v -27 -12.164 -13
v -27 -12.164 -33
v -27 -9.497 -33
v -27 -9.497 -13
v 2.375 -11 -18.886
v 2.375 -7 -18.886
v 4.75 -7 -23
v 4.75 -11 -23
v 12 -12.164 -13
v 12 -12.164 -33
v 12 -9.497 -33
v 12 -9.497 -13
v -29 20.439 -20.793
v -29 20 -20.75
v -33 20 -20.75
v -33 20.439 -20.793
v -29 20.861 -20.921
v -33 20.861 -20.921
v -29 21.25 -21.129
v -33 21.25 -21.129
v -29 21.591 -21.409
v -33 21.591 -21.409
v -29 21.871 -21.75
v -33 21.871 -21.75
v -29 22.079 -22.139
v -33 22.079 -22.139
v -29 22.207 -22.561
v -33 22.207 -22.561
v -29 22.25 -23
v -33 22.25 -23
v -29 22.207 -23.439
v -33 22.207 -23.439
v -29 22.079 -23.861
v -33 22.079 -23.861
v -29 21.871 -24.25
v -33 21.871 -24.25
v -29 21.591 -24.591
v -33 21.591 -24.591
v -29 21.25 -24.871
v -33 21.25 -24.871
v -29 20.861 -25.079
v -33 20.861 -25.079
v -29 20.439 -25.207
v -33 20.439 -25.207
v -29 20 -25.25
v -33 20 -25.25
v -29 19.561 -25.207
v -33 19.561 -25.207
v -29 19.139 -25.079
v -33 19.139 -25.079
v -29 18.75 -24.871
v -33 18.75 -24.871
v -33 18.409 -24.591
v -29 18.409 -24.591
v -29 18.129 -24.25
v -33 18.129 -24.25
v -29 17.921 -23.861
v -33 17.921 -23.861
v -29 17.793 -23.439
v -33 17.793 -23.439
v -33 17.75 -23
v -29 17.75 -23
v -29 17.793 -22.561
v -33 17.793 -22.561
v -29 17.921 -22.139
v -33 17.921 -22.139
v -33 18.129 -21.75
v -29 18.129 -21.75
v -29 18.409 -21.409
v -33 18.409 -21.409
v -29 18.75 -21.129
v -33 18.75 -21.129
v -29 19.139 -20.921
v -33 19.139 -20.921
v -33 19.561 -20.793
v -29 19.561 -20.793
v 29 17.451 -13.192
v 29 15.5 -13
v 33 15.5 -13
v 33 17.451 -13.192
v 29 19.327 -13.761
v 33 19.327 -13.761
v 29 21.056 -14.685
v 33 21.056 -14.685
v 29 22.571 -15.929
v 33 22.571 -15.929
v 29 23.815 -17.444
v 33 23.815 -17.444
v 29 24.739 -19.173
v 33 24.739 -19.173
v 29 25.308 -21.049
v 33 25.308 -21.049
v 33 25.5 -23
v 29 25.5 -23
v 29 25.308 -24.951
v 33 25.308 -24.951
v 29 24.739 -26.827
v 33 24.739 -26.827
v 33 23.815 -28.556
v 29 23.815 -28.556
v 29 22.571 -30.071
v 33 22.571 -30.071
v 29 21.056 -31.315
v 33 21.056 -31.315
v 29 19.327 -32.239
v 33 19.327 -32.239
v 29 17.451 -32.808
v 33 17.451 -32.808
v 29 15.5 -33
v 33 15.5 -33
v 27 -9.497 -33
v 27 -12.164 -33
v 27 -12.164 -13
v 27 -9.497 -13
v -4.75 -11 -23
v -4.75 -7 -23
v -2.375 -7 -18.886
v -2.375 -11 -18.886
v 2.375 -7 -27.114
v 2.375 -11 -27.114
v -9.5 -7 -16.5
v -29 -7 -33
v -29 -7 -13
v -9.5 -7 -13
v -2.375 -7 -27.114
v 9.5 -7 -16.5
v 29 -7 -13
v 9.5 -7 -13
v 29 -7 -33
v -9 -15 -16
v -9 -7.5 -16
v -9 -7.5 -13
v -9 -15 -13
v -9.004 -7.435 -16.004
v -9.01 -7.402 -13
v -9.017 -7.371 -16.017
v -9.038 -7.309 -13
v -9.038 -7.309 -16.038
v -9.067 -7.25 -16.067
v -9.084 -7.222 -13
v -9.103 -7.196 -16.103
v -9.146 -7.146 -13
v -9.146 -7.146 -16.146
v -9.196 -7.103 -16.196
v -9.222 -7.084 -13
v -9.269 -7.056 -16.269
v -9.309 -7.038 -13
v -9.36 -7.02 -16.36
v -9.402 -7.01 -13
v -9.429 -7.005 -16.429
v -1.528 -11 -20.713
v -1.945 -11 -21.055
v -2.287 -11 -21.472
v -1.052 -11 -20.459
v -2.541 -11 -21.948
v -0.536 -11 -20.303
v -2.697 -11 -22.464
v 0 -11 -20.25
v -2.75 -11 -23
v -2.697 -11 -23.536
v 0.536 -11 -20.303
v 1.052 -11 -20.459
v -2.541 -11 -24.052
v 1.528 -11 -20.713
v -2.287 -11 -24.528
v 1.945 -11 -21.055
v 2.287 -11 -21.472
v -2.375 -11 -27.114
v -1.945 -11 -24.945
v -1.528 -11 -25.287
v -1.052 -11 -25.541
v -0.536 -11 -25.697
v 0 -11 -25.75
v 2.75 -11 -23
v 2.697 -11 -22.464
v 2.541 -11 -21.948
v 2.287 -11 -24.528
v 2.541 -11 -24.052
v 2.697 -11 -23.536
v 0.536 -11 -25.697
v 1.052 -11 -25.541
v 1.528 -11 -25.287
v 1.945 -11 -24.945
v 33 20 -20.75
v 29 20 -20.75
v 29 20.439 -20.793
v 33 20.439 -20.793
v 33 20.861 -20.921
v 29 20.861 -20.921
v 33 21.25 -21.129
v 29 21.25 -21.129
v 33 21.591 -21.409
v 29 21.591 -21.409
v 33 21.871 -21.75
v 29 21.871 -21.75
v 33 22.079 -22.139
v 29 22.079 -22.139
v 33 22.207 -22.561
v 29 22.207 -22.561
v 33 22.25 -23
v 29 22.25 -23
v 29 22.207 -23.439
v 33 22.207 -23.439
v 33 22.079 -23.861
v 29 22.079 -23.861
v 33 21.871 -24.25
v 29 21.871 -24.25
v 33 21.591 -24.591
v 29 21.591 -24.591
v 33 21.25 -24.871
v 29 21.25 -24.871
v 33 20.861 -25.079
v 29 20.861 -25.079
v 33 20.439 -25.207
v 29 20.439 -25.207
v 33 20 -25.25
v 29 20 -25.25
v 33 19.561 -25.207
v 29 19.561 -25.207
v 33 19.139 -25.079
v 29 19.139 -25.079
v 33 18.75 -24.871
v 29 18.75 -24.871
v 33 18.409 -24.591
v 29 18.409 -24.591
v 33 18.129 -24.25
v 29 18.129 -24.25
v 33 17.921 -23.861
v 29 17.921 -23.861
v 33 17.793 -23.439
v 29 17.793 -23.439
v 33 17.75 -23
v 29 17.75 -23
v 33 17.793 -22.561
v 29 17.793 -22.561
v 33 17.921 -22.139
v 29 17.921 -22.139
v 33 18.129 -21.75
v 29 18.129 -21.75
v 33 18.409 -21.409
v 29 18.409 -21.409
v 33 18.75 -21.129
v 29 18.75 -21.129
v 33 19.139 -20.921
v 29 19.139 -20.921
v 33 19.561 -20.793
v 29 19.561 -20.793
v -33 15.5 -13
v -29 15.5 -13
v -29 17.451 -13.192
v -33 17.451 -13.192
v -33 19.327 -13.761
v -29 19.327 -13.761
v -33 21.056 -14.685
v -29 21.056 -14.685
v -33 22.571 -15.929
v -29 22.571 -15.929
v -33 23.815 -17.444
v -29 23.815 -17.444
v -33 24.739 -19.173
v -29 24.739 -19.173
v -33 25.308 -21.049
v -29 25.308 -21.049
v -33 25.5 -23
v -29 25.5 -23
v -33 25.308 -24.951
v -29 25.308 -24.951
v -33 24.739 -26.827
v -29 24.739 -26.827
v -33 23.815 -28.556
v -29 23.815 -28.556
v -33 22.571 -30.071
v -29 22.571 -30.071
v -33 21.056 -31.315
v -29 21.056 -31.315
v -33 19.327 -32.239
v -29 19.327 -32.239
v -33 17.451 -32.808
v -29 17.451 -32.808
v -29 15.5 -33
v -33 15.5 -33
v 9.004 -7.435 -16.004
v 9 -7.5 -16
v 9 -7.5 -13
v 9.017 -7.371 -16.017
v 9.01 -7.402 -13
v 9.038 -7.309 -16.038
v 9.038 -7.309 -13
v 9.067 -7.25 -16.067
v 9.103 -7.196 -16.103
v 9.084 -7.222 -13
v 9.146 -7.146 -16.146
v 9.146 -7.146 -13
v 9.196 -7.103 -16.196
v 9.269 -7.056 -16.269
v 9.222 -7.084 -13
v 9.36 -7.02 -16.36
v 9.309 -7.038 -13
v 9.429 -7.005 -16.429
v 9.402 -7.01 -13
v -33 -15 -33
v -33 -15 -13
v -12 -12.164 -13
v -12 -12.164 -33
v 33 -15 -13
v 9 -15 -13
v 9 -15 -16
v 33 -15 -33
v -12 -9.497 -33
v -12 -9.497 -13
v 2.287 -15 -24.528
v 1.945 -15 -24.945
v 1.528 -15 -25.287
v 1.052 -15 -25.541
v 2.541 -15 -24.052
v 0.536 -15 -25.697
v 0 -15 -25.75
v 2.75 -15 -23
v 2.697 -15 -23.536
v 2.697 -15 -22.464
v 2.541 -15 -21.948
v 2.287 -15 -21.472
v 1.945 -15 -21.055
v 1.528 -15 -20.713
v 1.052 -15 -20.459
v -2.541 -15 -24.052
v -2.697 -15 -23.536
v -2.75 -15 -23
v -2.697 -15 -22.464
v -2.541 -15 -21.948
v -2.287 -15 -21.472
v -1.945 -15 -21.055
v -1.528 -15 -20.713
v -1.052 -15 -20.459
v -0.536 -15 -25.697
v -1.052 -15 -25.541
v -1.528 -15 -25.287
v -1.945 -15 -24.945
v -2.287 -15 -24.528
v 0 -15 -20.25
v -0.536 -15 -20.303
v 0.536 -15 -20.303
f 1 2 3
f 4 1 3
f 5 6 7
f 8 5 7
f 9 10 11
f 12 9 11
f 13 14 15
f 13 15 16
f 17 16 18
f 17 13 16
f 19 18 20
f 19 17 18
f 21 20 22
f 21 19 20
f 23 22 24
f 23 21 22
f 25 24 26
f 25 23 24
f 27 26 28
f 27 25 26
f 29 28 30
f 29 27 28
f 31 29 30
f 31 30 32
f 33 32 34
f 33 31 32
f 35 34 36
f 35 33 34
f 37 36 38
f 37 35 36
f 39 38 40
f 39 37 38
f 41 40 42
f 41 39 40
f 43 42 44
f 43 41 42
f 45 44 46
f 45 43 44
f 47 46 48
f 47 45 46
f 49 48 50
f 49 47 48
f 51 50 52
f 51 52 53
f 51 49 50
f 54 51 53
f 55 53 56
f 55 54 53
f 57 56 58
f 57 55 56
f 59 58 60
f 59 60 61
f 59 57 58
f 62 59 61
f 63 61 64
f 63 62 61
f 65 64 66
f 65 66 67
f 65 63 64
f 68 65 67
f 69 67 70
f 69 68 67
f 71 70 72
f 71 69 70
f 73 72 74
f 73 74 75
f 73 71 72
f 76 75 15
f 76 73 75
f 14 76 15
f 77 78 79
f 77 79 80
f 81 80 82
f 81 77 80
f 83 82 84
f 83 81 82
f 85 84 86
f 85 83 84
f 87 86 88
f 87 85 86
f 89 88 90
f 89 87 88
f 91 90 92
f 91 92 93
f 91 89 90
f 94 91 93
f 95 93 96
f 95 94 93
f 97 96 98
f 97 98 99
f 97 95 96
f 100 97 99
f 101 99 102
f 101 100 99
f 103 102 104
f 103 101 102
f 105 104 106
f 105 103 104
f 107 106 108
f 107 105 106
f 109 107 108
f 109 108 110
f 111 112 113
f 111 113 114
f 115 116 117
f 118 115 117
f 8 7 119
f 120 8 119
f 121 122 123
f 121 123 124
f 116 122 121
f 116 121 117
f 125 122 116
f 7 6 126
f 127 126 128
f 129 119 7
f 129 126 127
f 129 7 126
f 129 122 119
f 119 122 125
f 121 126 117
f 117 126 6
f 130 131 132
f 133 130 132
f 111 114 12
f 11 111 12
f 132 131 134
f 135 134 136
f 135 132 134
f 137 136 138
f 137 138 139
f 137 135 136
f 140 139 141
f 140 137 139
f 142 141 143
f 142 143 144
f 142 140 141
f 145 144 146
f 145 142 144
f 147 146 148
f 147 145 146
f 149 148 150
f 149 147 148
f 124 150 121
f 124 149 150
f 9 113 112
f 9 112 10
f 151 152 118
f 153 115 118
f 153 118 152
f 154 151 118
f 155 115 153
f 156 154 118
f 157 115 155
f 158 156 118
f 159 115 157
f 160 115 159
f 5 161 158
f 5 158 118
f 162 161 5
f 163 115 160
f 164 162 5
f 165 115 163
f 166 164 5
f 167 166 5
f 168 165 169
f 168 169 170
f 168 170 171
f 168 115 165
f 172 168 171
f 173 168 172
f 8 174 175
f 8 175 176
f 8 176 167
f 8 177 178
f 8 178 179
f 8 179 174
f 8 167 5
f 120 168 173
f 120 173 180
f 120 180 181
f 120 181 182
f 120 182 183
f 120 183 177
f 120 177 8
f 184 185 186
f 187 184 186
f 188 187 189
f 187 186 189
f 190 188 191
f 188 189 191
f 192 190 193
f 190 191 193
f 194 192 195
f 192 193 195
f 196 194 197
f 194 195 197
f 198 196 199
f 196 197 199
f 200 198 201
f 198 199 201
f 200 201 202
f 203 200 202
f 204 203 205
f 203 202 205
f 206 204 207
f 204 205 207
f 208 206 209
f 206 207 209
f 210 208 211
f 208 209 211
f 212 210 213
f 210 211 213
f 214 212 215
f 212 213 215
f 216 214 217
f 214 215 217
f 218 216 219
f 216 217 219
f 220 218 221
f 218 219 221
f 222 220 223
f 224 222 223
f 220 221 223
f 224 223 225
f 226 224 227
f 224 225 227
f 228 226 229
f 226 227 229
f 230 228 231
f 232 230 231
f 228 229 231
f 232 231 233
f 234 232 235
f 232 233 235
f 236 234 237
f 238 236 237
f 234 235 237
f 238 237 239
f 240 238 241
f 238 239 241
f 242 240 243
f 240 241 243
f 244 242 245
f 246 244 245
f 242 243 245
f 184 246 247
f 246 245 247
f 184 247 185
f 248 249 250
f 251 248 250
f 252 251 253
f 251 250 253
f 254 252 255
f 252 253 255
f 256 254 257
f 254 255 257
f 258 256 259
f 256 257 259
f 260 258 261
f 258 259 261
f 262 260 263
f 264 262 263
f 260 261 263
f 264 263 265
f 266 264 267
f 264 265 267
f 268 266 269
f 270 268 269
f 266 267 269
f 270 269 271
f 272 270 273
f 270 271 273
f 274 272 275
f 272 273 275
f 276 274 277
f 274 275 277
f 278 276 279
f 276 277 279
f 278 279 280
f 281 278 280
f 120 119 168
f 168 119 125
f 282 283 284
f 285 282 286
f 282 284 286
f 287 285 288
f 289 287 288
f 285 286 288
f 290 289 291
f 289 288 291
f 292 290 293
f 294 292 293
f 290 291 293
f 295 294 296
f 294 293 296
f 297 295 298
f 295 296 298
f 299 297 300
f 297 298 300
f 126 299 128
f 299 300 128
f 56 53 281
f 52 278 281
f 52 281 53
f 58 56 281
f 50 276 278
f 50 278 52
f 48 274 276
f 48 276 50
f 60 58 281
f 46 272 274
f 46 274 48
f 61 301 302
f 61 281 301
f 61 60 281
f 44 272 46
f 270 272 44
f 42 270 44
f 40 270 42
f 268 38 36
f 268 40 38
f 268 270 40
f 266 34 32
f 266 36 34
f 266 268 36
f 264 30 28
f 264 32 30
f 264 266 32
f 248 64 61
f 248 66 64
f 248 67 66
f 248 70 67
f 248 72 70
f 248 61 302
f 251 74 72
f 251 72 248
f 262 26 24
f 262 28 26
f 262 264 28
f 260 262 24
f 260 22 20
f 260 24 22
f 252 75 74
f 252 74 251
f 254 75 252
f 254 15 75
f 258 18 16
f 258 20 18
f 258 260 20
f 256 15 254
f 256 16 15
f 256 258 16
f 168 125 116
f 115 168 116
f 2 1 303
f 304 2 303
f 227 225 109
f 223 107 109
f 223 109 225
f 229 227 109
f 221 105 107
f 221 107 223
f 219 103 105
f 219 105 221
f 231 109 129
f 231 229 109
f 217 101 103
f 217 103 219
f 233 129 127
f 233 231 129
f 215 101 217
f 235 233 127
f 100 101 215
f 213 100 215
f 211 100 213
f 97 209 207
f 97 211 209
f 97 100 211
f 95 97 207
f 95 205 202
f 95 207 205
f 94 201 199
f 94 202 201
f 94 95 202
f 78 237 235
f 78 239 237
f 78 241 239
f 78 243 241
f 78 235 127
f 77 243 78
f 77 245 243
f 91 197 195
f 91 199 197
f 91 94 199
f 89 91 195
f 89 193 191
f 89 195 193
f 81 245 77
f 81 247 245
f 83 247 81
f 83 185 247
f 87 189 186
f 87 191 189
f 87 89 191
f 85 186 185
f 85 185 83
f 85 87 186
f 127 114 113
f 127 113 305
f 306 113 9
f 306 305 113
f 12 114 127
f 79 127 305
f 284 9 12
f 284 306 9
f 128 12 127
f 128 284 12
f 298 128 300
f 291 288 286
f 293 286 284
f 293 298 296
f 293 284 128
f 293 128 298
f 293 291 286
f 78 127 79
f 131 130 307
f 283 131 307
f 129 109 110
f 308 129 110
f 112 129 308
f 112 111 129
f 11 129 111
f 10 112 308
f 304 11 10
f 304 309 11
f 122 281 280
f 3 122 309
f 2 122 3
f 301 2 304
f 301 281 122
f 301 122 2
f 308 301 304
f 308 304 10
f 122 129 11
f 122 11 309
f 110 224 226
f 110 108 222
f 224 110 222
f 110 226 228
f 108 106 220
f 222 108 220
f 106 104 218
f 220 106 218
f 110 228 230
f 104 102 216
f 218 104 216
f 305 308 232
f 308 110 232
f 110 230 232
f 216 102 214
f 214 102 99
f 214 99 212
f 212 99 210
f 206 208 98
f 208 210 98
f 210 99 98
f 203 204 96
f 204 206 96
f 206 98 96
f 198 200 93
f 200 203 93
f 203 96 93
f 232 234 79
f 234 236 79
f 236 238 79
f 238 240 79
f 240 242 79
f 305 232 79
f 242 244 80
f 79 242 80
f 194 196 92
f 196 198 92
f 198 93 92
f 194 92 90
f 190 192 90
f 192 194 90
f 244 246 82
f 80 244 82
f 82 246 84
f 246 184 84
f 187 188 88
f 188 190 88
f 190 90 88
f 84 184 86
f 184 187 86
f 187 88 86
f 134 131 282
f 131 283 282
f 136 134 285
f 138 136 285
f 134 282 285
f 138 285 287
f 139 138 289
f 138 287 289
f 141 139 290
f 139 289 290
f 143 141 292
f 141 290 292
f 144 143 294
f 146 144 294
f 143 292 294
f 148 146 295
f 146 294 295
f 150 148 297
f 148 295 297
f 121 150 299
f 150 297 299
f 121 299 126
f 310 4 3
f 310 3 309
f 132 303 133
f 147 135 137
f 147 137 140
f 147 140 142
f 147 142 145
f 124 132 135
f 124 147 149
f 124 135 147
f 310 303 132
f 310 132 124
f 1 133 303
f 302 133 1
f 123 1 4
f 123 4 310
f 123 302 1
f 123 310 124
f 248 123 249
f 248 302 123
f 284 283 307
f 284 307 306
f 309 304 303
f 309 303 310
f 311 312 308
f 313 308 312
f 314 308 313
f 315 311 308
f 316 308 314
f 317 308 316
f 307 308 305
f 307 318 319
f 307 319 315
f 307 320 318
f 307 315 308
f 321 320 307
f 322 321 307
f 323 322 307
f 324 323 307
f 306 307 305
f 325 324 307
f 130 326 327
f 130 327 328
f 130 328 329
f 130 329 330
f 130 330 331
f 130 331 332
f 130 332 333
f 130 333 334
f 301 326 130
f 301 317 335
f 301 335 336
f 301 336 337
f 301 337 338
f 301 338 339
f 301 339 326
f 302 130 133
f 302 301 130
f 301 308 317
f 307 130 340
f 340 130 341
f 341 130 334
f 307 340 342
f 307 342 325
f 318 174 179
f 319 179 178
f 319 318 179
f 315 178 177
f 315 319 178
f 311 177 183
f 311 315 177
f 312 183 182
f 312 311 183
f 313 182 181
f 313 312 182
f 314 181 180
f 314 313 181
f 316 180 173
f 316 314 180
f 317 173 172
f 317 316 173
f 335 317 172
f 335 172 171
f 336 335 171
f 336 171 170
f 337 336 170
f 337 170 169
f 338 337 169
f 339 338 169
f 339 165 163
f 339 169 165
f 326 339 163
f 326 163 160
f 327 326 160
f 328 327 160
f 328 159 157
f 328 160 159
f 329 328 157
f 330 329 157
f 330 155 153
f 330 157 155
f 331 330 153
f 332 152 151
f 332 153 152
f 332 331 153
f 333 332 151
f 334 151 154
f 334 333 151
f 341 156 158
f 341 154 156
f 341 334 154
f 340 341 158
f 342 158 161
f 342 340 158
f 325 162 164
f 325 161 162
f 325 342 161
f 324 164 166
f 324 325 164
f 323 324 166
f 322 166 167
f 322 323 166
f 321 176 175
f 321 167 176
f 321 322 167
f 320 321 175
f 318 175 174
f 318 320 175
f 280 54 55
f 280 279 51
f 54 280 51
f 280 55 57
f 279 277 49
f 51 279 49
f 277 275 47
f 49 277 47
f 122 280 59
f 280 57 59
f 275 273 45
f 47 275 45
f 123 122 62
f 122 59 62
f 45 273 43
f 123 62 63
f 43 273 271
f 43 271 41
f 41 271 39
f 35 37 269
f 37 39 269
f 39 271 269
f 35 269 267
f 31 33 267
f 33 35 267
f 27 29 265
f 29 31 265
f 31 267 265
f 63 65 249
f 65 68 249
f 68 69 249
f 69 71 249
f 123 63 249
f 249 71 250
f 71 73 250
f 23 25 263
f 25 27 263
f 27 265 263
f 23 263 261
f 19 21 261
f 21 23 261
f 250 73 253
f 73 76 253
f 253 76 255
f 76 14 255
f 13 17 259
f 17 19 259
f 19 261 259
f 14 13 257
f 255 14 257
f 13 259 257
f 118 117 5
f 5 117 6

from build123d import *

# Parameters (mm, degrees)
SKETCH005_W             = 58
SKETCH005_H             = 20
SKETCH005_R             = 2.75
PAD004_DEPTH            = 8
SKETCH006_R             = 2.25
PAD005_DEPTH            = 4
POCKET005_DEPTH         = 4
SKETCH011_W             = 15
SKETCH011_H             = 2.666667
POCKET007_DEPTH         = 20
SKETCH012_W             = 18
SKETCH012_H             = 3
POCKET008_DEPTH         = 8
FILLET_R                = 0.5
BODY002_PLACEMENT_ANGLE = 180


with BuildPart() as part:
    # Sketch005 → Pad004 (new body)
    with BuildSketch(Plane.XZ):
        Rectangle(SKETCH005_W, SKETCH005_H)
        Circle(SKETCH005_R, mode=Mode.SUBTRACT)
    extrude(amount=PAD004_DEPTH)

    # Sketch006 (on Face4 of Pad004) → Pad005 (join)
    with BuildSketch(Plane(origin=(-29, 0, 0), x_dir=(0, 0, -1), z_dir=(-1, 0, 0))):
        with BuildLine():
            Line((-10, 0), (10, 0))
            Line((10, 0), (10, 30.5))
            ThreePointArc((10, 30.5), (0, 40.5), (-10, 30.5))
            Line((-10, 30.5), (-10, 0))
        make_face()
        with Locations((0, 35)):
            Circle(SKETCH006_R, mode=Mode.SUBTRACT)
    pad005 = extrude(amount=PAD005_DEPTH)

    # Mirrored003: Pad005 across YZ
    add(pad005.mirror(Plane.YZ))

    # Sketch007 (on Face5 of Mirrored003) → Pocket005 (cut)
    with BuildSketch(Plane.XZ.offset(8)):
        Polygon((2.374981, 4.113632), (-2.375019, 4.11361), (-4.75, -2.2e-05), (-2.374981, -4.113632), (2.375019, -4.11361), (4.75, 2.2e-05), align=None)
    extrude(amount=-POCKET005_DEPTH, mode=Mode.SUBTRACT)

    # Sketch011 (on Face14 of Pocket005) → Pocket007 (cut)
    with BuildSketch(Plane(origin=(0, 0, 10), x_dir=(-1, 0, 0), z_dir=(0, 0, 1))):
        with Locations((-19.5, 4.169504)):
            Rectangle(SKETCH011_W, SKETCH011_H)
    pocket007 = extrude(amount=-POCKET007_DEPTH, mode=Mode.SUBTRACT)

    # Mirrored004: Pocket007 across YZ
    add(pocket007.mirror(Plane.YZ), mode=Mode.SUBTRACT)

    # Sketch012 (on Face3 of Mirrored004) → Pocket008 (cut)
    with BuildSketch(Plane(origin=(0, 0, 0), x_dir=(1, 0, 0), z_dir=(0, 1, 0))):
        with Locations((0, 8.5)):
            Rectangle(SKETCH012_W, SKETCH012_H)
    extrude(amount=-POCKET008_DEPTH, mode=Mode.SUBTRACT)

    # Fillet
    fillet_edges = [part.edges().sort_by_distance(p)[0] for p in [
        (0, -8, -7),
        (9, -8, -8.5),
        (-9, -8, -8.5),
    ]]
    fillet(fillet_edges, radius=FILLET_R)


with BuildPart() as part_1:
    # Body002 placement: moved
    add(part.part.moved(Location((0, -15, -23))).rotate(Axis((0, -15, -23), (1, 0, 0)), BODY002_PLACEMENT_ANGLE))


solid = part_1.part
